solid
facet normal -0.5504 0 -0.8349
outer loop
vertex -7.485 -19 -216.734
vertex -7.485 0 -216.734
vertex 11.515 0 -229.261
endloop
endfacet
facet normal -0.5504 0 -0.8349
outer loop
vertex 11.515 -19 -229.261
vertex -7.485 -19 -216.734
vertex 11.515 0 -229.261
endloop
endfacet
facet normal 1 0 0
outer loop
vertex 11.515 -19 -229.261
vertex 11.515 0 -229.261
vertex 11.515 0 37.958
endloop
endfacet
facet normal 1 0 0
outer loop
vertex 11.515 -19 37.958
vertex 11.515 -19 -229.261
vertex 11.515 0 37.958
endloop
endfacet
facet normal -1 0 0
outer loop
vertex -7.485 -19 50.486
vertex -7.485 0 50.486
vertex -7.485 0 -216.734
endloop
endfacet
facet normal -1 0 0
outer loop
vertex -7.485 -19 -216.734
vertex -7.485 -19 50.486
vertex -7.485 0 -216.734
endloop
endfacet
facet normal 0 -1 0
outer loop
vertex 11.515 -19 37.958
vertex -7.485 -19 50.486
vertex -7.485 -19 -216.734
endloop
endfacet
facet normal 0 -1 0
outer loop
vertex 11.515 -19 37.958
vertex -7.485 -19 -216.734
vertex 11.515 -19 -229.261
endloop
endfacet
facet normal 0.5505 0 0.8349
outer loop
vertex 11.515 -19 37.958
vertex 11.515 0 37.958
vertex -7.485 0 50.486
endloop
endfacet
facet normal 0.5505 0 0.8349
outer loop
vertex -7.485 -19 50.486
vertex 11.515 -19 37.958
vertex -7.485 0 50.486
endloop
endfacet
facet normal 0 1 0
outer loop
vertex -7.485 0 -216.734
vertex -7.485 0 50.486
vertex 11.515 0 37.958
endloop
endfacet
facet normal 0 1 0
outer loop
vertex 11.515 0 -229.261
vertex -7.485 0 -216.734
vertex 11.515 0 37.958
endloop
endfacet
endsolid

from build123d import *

# Parameters (mm, degrees)
F1_DEPTH = 19


with BuildPart() as f1:
    # F0 (on Front) → F1 (new body)
    with BuildSketch(Plane.XZ):
        Polygon((11.51464, 37.958085), (-7.48536, 50.485557), (-7.48536, -216.733724), (11.51464, -229.261196), align=None)
    extrude(amount=F1_DEPTH)


with BuildPart() as f2_1:
    # F2: copy of F1
    add(f1.part)


solid = f1.part
